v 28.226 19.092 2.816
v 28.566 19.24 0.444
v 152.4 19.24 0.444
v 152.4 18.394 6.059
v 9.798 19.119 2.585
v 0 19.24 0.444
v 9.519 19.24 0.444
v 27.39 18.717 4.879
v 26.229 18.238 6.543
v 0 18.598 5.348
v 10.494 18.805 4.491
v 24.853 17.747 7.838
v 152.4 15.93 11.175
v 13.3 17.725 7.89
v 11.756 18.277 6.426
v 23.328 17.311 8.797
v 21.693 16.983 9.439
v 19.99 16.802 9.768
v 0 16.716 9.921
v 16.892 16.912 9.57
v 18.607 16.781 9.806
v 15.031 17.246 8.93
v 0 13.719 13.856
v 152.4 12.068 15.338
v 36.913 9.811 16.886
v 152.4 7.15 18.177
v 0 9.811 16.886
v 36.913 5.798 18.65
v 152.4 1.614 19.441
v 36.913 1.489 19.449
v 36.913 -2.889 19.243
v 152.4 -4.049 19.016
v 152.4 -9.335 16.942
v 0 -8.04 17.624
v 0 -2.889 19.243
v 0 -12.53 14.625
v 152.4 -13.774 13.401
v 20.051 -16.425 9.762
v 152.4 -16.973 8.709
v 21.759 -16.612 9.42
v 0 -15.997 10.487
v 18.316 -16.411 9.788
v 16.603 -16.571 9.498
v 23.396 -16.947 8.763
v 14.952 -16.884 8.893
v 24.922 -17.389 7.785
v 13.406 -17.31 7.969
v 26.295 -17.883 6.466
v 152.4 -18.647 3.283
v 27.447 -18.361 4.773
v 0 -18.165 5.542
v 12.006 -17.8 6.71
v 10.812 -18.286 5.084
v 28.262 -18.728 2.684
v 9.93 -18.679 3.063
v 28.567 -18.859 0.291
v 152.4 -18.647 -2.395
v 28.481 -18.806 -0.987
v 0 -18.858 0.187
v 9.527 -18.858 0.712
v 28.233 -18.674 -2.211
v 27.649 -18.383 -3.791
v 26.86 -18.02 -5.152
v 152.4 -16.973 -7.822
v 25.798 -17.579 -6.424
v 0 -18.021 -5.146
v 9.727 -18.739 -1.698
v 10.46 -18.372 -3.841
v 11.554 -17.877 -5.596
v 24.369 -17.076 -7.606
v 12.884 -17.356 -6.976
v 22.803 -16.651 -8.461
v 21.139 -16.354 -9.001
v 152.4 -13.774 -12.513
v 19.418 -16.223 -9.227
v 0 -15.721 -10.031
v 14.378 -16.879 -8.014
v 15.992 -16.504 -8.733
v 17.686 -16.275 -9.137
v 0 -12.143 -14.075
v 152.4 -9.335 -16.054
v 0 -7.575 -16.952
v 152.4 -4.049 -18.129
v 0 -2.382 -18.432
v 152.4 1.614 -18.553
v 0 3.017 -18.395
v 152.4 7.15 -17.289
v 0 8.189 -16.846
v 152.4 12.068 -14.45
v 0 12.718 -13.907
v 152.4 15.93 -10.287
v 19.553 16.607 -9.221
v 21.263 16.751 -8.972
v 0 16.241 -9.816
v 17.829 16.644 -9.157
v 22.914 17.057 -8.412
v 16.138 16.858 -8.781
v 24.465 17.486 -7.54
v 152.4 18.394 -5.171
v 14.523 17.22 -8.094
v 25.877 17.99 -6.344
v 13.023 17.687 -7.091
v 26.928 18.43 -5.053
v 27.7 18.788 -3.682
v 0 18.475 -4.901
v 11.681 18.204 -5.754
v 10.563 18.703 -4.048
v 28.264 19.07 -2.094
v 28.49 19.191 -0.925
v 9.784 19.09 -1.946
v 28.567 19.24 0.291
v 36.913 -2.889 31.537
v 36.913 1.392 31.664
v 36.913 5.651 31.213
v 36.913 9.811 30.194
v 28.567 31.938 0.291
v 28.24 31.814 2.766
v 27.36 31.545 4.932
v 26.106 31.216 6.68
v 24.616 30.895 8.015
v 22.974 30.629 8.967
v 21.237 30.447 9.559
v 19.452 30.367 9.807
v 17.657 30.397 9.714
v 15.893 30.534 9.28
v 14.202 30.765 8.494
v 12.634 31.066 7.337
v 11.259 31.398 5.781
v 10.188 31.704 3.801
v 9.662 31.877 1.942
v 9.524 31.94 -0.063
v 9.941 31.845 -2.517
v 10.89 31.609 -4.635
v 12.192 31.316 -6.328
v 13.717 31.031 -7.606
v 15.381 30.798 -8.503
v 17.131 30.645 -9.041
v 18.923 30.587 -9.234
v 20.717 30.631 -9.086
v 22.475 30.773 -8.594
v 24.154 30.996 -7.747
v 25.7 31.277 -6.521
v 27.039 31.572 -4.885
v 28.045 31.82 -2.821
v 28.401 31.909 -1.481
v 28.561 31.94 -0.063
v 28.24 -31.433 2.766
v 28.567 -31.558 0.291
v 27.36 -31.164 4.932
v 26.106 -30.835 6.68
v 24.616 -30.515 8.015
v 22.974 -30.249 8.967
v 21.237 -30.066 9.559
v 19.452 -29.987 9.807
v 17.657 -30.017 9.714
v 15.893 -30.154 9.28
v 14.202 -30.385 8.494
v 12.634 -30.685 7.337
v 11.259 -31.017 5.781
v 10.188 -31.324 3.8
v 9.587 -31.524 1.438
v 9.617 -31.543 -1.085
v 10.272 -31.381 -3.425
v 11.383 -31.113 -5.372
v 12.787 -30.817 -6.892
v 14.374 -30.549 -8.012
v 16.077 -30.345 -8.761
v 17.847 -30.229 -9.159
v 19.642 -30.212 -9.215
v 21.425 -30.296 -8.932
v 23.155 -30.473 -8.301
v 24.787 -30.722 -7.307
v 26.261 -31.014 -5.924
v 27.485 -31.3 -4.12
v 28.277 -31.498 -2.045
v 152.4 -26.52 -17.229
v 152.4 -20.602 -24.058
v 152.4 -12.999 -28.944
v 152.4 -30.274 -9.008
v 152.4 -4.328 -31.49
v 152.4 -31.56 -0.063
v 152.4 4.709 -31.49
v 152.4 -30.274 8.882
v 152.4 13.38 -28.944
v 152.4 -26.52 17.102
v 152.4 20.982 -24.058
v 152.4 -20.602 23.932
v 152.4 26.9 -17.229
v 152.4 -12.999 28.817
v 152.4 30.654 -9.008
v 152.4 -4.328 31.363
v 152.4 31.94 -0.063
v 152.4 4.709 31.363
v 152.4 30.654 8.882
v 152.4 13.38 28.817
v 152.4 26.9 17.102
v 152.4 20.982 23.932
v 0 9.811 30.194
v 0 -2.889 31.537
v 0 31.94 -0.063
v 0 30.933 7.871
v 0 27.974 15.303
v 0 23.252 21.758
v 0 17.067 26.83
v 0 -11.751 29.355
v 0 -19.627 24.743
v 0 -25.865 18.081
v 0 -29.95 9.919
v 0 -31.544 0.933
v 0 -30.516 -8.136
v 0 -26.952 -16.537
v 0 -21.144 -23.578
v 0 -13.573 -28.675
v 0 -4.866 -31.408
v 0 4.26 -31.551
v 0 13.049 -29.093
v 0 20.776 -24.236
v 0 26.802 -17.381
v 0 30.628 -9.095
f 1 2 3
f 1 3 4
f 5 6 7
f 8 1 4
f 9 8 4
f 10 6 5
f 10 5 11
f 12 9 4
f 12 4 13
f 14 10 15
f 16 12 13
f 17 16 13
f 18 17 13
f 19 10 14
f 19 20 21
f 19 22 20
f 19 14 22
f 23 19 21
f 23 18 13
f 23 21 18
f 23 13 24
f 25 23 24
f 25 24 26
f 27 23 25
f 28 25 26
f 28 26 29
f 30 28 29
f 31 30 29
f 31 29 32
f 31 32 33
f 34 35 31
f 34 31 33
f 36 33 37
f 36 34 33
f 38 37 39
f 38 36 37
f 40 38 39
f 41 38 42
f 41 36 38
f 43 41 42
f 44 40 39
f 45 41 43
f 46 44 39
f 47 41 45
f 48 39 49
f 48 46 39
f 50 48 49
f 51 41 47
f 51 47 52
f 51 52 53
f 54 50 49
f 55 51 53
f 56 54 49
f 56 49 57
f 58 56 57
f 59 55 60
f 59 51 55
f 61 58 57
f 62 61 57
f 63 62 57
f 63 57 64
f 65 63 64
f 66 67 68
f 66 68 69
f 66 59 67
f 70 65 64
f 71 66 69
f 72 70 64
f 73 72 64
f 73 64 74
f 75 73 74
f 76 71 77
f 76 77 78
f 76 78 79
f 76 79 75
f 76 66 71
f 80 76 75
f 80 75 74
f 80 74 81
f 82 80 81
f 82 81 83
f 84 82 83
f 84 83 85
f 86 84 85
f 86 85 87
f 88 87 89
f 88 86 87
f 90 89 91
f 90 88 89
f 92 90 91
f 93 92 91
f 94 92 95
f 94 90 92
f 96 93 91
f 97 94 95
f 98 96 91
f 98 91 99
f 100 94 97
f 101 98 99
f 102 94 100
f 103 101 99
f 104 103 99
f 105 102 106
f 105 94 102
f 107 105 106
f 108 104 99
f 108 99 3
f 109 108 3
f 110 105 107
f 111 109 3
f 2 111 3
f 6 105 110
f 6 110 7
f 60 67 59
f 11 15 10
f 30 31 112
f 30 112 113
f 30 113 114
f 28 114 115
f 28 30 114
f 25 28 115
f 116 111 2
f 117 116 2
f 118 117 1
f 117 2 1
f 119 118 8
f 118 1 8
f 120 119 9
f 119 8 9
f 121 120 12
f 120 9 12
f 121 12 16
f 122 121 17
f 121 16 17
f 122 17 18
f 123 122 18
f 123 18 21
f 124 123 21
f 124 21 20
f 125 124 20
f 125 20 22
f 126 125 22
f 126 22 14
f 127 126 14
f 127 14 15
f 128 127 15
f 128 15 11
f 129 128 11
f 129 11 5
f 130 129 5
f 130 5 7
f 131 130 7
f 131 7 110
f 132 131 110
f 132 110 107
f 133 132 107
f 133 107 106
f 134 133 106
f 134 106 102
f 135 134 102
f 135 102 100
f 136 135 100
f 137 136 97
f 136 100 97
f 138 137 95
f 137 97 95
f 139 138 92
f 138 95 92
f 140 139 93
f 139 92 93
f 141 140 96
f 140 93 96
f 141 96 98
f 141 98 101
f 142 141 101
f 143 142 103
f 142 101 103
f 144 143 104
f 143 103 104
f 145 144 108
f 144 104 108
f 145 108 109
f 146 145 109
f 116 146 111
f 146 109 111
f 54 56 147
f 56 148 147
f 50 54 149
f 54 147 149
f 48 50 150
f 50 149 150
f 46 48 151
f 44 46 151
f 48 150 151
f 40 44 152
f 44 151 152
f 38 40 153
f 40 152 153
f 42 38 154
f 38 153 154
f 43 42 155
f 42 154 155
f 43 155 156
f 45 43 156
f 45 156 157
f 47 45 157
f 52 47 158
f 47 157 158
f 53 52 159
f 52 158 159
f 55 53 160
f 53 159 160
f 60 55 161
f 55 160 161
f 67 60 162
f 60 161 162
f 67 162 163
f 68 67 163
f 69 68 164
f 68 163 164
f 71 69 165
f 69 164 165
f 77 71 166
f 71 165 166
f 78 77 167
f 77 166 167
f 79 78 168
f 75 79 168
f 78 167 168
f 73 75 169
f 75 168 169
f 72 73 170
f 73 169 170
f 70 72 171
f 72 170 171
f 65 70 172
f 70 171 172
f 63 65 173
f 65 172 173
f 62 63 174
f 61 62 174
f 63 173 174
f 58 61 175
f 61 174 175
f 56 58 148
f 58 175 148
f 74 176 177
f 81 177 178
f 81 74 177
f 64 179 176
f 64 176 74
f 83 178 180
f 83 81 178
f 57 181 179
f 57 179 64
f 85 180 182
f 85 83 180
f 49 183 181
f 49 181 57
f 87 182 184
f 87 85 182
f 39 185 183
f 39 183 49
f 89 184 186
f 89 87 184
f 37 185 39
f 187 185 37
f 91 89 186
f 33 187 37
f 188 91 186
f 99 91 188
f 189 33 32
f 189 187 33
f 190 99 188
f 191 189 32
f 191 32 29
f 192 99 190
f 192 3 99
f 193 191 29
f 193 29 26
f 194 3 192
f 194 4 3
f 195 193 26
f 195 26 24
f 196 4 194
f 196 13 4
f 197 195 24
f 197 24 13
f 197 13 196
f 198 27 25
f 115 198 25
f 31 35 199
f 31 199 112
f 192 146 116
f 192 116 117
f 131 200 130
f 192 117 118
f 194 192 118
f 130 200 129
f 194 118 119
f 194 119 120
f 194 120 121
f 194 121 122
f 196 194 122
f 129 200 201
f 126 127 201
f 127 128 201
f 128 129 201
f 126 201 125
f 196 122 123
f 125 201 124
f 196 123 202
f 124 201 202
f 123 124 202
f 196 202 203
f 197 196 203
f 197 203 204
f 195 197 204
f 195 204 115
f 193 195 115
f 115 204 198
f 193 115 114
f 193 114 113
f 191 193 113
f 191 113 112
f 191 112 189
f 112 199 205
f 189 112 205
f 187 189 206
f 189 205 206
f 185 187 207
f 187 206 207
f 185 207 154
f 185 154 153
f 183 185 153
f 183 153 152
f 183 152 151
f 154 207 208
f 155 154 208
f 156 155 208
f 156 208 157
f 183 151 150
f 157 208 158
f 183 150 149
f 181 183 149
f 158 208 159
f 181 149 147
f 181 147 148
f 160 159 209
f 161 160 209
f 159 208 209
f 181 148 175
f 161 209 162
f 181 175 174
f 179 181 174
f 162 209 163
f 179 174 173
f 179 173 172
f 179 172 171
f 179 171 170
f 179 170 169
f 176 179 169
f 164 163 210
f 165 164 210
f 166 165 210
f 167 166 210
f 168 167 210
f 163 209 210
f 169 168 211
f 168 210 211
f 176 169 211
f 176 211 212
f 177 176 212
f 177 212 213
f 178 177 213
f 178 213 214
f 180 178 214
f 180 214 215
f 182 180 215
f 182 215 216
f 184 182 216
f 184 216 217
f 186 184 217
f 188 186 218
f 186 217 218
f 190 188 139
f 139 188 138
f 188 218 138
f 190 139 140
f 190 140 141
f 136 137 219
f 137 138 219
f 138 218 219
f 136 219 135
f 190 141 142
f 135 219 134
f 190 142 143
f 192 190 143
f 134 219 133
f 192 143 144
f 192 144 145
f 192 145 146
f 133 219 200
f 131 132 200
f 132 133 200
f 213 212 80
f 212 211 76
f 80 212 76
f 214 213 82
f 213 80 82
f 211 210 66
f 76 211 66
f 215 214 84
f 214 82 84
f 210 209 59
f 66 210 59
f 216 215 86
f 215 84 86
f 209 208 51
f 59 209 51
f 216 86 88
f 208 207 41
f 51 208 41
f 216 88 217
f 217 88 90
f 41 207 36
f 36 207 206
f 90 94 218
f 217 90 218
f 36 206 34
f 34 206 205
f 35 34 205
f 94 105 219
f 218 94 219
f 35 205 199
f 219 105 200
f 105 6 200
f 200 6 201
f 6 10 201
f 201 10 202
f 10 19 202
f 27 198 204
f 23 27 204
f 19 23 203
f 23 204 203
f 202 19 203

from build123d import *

# Parameters (mm, degrees)
F0_R     = 31.75
F2_DEPTH = 152.4
F1_R     = 19.05
F3_DEPTH = 152.4
F4_R     = 9.525
F5_DEPTH = 38.1
F6_W     = 38.1
F6_H     = 12.7
F7_DEPTH = 50.8


with BuildPart() as f2:
    # F0 (on Right) → F2 (new body)
    with BuildSketch(Plane.YZ):
        with Locations((0.1902006916, -0.0633993695)):
            Circle(F0_R)
    extrude(amount=F2_DEPTH)

    # F1 (on Right) → F3 (cut)
    with BuildSketch(Plane.YZ):
        with Locations((0.1902006916, 0.4437955504)):
            Circle(F1_R)
    extrude(amount=F3_DEPTH, mode=Mode.SUBTRACT)

    # F4 (on Front) → F5 (cut, symmetric)
    with BuildSketch(Plane.XZ):
        with Locations((19.0424583852, 0.2906440059)):
            Circle(F4_R)
    extrude(amount=F5_DEPTH, both=True, mode=Mode.SUBTRACT)

    # F6 (on Top) → F7 (cut)
    with BuildSketch(Plane.XY):
        with Locations((17.8630856547, 3.4606340123)):
            Rectangle(F6_W, F6_H)
    extrude(amount=F7_DEPTH, mode=Mode.SUBTRACT)


solid = f2.part
